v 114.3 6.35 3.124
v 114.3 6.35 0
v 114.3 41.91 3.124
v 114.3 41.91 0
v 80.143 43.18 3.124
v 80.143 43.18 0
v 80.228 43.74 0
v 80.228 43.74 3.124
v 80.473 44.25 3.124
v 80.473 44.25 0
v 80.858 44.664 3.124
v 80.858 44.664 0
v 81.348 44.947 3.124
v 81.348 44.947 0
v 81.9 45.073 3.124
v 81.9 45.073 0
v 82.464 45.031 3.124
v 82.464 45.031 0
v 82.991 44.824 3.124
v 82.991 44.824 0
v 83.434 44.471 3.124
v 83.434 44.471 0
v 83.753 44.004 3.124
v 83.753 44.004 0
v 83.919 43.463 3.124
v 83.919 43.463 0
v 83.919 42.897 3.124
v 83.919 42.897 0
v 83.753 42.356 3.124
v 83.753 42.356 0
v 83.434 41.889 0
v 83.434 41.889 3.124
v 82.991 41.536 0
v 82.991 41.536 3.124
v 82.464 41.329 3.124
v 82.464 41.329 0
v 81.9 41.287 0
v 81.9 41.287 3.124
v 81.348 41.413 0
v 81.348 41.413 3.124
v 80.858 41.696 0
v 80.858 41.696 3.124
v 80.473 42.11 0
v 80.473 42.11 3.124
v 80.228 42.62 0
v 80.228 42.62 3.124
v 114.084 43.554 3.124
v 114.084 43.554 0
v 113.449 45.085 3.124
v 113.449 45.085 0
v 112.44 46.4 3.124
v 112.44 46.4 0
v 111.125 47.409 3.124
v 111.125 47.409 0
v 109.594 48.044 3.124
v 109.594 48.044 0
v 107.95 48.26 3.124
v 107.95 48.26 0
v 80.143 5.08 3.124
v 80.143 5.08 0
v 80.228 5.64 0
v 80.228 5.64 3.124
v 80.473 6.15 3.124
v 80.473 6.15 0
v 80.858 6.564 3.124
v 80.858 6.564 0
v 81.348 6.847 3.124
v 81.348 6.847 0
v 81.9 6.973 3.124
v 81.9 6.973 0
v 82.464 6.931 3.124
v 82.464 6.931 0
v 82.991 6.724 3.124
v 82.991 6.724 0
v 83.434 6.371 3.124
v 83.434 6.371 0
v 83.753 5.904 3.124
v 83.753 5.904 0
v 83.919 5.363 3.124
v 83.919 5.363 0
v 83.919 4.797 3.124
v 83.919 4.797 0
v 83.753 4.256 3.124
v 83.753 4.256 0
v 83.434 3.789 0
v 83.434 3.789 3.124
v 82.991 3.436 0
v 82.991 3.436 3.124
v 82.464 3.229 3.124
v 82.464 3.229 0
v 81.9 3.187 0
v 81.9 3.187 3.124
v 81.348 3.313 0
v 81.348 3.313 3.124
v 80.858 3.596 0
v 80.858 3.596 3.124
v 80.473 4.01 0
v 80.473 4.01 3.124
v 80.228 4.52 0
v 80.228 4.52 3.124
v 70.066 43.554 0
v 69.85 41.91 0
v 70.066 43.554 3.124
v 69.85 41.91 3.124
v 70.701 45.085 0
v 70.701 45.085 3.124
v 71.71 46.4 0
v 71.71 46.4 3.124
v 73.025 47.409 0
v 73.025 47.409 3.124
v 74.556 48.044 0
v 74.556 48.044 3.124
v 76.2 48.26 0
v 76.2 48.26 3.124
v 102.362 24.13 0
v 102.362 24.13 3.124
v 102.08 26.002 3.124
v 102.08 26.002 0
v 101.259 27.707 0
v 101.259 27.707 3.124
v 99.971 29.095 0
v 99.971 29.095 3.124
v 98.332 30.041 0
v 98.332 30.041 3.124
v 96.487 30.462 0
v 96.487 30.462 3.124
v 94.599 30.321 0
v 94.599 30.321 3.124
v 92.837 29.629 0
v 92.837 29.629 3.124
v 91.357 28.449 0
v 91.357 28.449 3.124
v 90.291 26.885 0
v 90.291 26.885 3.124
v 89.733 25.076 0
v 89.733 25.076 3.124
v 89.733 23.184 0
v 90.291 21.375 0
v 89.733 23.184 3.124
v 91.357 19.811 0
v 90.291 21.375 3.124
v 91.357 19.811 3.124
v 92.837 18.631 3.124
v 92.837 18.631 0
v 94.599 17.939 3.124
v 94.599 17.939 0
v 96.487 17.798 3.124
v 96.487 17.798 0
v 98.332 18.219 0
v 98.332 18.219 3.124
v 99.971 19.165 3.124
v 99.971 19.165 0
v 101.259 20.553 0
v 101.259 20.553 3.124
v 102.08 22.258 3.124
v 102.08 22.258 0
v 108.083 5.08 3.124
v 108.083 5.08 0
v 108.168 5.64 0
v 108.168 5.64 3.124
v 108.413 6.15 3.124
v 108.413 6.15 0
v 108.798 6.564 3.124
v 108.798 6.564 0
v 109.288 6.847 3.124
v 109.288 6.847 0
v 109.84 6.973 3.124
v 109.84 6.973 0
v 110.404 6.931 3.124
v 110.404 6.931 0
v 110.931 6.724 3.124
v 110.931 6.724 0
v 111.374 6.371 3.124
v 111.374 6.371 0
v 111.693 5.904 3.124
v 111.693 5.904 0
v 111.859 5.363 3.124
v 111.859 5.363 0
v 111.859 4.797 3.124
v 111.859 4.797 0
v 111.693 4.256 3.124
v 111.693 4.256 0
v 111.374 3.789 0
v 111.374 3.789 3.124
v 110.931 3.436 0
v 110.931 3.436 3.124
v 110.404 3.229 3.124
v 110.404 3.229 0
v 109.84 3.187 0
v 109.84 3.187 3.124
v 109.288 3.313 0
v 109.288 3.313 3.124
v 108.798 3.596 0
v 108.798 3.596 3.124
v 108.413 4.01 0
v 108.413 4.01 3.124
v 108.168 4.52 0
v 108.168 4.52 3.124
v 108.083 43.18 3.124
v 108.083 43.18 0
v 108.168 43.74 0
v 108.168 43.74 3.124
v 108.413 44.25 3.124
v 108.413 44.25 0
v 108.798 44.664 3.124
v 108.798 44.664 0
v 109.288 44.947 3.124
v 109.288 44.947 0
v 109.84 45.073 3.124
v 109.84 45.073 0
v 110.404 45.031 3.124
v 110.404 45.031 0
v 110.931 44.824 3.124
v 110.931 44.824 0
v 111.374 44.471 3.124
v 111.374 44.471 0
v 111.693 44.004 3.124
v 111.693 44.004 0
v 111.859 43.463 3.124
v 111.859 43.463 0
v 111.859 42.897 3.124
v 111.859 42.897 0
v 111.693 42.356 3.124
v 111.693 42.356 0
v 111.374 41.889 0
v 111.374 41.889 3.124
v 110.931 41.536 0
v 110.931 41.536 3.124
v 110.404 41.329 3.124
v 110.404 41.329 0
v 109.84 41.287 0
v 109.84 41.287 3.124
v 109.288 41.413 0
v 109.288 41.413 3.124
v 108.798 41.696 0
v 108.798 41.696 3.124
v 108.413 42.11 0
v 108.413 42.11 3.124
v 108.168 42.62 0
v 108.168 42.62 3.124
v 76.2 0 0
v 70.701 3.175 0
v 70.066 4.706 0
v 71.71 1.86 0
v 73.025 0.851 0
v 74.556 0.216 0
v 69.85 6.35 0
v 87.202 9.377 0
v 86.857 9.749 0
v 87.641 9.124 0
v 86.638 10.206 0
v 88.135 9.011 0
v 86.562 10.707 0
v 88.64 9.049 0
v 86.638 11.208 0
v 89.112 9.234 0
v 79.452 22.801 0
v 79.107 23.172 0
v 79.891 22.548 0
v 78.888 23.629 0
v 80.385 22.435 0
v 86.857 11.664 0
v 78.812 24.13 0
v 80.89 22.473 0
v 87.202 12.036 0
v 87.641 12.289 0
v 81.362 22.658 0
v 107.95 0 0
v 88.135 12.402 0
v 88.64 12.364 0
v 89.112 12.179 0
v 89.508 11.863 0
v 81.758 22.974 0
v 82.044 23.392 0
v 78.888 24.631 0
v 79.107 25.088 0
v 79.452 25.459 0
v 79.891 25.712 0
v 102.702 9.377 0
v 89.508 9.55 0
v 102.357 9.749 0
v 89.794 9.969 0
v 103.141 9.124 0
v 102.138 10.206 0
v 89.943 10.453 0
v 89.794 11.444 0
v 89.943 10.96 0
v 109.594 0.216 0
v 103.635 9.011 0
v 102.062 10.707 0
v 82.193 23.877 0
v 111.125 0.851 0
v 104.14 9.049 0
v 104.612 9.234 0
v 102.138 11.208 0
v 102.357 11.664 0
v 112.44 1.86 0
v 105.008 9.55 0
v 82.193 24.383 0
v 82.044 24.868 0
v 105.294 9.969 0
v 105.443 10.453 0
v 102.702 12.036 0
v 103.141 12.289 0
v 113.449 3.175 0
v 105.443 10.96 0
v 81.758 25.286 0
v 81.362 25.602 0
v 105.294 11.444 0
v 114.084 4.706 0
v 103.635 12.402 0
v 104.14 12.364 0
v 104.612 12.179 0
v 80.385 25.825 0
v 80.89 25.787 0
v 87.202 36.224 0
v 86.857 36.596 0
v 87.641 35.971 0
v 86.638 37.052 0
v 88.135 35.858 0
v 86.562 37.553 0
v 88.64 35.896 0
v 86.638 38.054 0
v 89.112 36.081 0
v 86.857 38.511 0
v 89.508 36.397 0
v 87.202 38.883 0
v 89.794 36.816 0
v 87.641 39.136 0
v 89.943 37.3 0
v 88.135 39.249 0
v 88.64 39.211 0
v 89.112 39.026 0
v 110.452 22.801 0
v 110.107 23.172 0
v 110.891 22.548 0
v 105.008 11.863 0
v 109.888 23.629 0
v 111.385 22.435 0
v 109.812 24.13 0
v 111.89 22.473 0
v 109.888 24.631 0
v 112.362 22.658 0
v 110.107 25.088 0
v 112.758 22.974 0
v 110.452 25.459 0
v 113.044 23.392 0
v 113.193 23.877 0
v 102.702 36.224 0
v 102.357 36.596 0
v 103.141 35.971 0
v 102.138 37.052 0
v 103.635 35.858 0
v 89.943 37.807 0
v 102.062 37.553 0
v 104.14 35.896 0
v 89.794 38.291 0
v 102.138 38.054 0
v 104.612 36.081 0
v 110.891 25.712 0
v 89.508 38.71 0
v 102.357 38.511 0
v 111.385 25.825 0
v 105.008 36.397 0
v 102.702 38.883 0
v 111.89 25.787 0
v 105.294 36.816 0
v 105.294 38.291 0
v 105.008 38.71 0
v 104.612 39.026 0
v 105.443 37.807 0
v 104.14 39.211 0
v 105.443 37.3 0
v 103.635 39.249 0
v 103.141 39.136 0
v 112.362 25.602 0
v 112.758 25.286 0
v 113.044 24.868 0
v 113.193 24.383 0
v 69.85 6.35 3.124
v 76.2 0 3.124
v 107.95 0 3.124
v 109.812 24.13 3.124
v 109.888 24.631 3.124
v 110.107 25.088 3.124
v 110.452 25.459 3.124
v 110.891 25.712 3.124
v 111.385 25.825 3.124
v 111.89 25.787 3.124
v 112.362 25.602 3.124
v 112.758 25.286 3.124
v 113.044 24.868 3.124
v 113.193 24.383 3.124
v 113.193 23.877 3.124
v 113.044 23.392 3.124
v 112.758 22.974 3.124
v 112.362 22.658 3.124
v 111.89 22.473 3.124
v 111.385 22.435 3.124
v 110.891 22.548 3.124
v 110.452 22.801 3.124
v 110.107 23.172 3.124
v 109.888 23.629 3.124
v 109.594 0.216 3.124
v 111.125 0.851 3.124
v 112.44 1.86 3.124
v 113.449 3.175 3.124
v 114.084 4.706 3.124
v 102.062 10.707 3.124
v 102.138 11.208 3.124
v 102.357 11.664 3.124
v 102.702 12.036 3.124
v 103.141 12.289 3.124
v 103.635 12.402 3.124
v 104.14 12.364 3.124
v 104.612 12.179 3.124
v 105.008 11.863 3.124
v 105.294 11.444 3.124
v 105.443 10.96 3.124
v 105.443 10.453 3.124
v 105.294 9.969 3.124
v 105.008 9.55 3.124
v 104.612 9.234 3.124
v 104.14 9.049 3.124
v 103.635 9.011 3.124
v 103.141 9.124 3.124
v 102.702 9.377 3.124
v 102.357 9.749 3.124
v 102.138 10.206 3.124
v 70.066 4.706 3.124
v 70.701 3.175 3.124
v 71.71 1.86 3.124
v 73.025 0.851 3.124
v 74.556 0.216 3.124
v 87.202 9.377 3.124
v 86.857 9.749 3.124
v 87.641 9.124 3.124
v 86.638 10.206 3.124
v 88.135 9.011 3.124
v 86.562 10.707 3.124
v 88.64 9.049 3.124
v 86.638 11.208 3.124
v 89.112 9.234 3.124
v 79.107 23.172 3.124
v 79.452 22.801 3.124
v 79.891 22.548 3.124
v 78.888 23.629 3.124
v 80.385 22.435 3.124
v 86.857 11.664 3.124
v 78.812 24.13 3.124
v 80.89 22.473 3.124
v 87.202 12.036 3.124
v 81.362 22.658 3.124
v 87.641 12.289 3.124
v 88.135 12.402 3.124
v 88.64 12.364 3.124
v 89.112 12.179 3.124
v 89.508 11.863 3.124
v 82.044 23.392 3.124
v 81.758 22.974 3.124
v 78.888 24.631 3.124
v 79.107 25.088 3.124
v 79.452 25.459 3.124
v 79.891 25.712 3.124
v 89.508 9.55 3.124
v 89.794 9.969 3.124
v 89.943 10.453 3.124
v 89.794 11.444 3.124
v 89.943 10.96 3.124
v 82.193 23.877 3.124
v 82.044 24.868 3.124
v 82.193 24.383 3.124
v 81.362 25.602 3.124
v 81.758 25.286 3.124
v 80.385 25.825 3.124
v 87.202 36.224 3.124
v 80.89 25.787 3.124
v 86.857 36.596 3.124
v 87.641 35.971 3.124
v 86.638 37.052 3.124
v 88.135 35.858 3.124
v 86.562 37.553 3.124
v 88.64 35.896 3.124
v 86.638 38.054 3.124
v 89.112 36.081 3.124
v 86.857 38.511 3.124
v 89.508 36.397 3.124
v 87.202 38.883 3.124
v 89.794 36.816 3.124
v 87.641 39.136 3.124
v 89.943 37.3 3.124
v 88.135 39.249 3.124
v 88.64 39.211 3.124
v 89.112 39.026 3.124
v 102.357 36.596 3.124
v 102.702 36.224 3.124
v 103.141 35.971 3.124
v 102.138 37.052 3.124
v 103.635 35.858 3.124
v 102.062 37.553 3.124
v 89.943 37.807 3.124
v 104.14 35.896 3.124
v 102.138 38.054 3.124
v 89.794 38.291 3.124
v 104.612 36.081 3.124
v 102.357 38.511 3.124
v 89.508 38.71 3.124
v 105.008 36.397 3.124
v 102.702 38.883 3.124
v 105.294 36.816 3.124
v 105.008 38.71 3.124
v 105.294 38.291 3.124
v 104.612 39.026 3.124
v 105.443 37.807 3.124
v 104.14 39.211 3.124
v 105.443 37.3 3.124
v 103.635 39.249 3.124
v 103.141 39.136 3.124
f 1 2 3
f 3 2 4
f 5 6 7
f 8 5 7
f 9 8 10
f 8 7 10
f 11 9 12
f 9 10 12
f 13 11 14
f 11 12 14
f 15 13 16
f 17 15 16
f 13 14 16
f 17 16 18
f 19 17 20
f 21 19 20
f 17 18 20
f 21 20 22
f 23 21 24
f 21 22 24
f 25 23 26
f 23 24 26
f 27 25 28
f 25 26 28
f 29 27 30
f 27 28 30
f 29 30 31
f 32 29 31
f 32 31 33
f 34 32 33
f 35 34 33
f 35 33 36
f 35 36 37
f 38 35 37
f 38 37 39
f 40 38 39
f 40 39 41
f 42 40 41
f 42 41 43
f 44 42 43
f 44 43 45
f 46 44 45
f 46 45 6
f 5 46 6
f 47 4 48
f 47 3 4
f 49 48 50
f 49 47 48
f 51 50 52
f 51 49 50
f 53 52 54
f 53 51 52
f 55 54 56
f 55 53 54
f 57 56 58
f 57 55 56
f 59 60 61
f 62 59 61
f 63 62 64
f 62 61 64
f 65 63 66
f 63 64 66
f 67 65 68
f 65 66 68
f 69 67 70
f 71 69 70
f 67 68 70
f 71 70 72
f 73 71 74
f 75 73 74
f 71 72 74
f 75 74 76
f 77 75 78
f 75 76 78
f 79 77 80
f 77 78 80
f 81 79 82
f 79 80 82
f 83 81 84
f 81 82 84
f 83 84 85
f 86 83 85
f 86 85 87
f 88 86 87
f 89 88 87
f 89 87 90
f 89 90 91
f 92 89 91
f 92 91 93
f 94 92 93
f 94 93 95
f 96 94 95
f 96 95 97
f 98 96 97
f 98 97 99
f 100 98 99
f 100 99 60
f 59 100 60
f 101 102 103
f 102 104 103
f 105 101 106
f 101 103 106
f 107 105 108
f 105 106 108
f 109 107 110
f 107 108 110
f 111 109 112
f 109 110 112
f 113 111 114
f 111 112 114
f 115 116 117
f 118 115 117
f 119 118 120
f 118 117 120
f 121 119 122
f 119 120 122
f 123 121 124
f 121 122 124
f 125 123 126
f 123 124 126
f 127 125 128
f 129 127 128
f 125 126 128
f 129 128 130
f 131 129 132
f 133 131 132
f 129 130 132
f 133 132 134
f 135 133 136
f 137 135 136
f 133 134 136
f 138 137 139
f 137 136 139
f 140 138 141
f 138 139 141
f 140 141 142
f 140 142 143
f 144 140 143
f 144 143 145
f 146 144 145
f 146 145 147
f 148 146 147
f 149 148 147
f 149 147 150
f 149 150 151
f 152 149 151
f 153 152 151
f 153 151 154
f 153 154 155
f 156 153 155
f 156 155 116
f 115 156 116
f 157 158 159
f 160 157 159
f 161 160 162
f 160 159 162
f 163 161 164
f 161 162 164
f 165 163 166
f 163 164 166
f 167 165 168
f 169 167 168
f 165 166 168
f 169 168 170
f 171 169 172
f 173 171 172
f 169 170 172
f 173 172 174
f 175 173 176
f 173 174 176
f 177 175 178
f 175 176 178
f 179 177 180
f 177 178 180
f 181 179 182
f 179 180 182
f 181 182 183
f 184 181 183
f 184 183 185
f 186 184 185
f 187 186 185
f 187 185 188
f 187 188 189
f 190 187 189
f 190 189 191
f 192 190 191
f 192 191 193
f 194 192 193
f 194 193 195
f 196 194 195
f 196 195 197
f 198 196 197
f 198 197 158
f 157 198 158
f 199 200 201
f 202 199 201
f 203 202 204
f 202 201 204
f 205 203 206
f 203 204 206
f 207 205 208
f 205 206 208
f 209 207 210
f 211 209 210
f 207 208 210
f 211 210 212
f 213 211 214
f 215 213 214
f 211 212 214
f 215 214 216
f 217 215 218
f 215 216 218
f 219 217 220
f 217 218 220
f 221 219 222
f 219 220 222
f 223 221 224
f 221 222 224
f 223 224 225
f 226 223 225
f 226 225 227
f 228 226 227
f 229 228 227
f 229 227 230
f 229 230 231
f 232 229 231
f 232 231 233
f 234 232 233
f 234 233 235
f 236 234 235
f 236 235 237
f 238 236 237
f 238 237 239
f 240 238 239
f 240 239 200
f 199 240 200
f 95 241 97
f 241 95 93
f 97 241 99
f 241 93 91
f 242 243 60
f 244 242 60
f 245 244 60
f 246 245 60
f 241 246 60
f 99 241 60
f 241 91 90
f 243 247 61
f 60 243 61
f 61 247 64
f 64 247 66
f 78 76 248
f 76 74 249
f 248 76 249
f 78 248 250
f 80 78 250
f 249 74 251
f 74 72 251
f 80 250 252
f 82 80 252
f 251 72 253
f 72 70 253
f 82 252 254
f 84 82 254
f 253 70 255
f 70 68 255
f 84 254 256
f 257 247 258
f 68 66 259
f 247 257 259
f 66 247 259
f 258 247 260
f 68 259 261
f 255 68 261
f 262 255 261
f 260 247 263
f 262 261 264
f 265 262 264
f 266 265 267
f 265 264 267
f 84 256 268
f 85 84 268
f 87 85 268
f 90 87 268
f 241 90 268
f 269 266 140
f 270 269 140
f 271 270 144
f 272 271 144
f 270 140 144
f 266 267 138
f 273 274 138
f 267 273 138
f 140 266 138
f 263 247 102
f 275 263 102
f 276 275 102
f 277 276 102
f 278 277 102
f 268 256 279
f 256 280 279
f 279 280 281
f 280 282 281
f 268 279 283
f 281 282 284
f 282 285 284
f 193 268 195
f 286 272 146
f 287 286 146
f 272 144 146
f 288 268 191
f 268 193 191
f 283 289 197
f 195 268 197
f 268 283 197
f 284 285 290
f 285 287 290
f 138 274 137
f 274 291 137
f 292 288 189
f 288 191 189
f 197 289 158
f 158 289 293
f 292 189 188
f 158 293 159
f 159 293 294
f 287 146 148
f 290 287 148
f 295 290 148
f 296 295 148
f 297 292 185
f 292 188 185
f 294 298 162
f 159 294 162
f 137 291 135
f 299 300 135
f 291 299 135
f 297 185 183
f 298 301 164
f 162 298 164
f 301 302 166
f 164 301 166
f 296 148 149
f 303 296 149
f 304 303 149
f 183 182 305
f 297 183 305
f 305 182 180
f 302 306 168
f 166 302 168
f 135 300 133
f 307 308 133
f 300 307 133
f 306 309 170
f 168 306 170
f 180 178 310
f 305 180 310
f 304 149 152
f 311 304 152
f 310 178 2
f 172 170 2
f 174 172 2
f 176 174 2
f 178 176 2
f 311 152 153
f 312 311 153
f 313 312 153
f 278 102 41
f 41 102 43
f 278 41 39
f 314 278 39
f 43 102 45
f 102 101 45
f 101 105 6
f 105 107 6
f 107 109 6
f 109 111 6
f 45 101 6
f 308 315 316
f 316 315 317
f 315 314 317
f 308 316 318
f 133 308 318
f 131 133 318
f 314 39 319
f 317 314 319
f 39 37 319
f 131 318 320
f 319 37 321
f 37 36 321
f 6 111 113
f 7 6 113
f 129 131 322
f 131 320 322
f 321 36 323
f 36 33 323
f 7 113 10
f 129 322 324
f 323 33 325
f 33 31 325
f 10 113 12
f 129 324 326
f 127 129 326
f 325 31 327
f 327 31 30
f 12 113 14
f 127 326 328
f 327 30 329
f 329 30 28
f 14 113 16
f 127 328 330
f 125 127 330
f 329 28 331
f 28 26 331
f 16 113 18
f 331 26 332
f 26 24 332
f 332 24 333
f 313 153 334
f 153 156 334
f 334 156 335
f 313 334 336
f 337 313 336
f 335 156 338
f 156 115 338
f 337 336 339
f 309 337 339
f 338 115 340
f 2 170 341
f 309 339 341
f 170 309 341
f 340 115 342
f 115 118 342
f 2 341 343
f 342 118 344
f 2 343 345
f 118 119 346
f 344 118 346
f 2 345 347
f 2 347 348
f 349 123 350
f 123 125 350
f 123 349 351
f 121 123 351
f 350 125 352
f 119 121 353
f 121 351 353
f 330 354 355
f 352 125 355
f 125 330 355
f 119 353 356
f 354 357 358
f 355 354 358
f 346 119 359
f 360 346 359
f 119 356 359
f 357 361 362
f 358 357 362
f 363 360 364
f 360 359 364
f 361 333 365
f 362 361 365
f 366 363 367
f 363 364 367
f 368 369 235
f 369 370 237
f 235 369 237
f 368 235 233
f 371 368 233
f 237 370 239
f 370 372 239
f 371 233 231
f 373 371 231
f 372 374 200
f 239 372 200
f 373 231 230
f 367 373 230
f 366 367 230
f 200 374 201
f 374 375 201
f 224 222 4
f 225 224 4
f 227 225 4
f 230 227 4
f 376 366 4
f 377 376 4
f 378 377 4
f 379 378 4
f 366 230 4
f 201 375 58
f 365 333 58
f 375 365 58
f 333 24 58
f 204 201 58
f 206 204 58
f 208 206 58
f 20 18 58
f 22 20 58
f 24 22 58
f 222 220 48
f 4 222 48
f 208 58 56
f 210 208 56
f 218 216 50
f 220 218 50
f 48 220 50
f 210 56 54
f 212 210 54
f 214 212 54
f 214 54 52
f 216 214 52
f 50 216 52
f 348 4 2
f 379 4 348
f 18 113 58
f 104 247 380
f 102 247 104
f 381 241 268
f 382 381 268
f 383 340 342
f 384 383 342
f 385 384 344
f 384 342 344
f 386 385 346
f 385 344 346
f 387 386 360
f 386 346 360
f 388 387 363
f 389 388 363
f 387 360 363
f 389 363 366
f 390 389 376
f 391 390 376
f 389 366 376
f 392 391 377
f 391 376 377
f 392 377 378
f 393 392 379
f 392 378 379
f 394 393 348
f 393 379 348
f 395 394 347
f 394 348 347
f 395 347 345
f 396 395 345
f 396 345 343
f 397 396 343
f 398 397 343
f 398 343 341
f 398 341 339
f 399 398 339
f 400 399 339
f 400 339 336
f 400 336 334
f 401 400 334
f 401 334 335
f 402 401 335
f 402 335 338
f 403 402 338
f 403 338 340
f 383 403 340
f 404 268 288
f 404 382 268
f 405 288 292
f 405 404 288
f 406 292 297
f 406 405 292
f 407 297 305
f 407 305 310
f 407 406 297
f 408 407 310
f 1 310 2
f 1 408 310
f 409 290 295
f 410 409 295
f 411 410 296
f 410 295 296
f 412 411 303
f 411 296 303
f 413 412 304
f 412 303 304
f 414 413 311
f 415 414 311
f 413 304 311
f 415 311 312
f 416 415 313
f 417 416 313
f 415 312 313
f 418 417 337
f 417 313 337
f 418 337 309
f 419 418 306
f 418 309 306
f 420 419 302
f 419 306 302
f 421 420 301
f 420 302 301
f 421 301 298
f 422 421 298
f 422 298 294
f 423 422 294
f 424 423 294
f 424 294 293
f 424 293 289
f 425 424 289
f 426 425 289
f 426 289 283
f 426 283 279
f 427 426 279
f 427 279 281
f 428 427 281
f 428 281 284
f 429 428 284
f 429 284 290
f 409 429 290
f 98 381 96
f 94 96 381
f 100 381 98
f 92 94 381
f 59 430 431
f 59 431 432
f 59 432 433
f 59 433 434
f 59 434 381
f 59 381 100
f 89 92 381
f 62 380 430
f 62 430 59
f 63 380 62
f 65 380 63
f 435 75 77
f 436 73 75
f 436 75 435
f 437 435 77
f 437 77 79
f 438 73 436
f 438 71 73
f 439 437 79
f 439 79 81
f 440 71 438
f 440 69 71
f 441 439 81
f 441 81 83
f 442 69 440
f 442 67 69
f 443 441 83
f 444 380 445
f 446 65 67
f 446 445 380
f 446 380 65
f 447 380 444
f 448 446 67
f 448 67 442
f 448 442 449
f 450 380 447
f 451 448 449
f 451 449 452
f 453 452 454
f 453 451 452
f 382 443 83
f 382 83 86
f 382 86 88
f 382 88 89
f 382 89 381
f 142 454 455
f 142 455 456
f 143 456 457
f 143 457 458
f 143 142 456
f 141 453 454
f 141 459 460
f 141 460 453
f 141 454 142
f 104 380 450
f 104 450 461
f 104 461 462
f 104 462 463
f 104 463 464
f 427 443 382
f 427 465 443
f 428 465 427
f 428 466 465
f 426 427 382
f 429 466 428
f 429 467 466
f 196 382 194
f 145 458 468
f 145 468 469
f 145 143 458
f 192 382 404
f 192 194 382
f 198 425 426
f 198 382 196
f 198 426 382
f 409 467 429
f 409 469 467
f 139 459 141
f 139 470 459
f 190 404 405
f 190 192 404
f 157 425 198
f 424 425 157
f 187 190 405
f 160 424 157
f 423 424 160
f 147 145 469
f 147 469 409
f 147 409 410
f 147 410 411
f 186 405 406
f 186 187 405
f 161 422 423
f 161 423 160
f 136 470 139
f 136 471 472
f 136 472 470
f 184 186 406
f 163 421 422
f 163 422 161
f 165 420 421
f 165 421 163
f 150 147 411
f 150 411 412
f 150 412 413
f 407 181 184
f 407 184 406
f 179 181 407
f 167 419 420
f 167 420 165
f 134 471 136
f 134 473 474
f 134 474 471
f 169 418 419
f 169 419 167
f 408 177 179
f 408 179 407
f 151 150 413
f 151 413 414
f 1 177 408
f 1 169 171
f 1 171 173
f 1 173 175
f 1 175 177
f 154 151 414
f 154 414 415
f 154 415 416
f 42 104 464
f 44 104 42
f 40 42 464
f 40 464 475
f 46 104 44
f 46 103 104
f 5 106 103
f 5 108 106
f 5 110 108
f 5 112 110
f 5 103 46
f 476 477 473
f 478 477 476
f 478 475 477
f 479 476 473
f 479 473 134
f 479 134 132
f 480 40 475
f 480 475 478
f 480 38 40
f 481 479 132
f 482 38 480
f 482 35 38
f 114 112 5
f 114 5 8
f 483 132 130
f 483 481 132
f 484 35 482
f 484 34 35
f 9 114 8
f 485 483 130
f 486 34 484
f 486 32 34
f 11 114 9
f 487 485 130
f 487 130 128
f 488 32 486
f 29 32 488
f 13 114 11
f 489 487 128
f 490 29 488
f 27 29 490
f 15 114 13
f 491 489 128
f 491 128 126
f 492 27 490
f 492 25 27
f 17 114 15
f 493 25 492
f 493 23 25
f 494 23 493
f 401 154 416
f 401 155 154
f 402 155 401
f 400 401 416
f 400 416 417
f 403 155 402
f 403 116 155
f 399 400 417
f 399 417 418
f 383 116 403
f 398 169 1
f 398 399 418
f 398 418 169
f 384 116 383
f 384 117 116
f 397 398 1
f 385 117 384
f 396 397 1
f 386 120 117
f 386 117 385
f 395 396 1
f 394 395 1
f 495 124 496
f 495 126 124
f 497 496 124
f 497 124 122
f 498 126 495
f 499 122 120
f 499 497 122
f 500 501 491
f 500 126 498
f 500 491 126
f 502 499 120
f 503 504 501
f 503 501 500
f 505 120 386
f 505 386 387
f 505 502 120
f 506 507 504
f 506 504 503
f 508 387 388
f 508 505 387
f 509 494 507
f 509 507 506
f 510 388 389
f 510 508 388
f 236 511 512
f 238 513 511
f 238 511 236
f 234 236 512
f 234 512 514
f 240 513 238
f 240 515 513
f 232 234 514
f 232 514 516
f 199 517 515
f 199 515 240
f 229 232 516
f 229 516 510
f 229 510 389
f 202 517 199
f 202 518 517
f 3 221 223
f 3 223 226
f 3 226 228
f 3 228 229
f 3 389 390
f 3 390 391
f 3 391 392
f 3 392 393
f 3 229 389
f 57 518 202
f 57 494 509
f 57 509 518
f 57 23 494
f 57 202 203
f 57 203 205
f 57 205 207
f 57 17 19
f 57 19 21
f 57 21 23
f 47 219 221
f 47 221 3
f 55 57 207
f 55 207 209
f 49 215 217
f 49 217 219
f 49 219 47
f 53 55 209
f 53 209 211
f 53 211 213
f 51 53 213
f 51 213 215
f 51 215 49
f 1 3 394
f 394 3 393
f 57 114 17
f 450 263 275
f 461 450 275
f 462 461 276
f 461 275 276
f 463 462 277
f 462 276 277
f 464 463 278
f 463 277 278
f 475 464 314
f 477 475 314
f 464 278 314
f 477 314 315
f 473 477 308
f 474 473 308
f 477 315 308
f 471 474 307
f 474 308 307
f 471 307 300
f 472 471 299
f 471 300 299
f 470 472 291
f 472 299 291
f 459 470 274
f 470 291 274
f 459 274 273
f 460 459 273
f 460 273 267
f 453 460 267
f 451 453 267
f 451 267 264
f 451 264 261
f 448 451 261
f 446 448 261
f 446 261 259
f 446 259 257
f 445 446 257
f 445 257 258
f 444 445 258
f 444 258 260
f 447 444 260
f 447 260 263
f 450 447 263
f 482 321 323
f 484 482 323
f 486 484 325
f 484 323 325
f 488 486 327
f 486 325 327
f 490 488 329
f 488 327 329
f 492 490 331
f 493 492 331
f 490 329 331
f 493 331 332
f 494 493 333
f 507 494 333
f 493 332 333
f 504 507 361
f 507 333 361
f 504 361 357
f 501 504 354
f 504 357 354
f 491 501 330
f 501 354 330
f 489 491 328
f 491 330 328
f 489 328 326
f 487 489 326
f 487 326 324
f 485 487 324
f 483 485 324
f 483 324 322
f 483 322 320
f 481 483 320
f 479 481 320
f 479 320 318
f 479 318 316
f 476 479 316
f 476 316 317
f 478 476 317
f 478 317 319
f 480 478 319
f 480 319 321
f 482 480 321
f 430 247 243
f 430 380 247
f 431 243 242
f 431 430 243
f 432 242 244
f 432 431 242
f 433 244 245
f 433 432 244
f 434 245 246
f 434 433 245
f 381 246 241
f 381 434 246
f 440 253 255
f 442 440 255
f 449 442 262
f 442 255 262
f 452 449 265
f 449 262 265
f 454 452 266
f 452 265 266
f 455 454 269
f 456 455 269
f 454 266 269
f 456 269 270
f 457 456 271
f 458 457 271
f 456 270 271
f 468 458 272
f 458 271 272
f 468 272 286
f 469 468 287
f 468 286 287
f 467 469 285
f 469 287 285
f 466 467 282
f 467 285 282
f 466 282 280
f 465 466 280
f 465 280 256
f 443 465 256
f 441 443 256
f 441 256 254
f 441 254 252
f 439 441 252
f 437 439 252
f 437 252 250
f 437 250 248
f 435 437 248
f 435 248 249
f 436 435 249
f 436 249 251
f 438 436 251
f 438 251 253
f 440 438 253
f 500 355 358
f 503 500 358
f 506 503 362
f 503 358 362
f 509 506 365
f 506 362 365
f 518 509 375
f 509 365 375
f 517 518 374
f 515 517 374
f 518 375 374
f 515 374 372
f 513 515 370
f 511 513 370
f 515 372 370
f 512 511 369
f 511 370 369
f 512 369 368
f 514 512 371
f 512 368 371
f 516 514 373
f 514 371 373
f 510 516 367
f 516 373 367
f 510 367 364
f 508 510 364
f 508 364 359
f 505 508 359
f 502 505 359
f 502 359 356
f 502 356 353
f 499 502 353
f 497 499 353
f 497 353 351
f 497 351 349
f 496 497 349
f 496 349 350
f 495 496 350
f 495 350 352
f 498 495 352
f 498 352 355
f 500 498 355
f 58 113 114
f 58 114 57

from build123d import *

# Parameters (mm, degrees)
SKETCH1_W                 = 44.45
SKETCH1_H                 = 48.26
BOSS_EXTRUDE1_DEPTH       = 3.1242
FILLET1_R                 = 6.35
F_6_CLEARANCE_HOLE1_D     = 3.7973
F_6_CLEARANCE_HOLE1_DEPTH = 5.08
F_6_CLEARANCE_HOLE1_TIP   = 1.140824014
SKETCH4_R                 = 6.35
CUT_EXTRUDE1_DEPTH        = 4.1242
M3_CLEARANCE_HOLE1_D      = 3.4


with BuildPart() as part:
    # Sketch1 → Boss-Extrude1 (new body)
    with BuildSketch(Plane.XY):
        with Locations((92.075, 24.13)):
            Rectangle(SKETCH1_W, SKETCH1_H)
    extrude(amount=BOSS_EXTRUDE1_DEPTH)

    # Fillet1
    fillet1_edges = [part.edges().sort_by_distance(p)[0] for p in [
        (69.85, 48.26, 1.5621),
        (114.3, 48.26, 1.5621),
        (114.3, 0, 1.5621),
        (69.85, 0, 1.5621),
    ]]
    fillet(fillet1_edges, radius=FILLET1_R)

    # #6 Clearance Hole1
    with Locations(Plane.XY.offset(3.1242)):
        with Locations((82.042, 43.18), (109.982, 43.18), (109.982, 5.08), (82.042, 5.08)):
            Hole(F_6_CLEARANCE_HOLE1_D / 2, depth=F_6_CLEARANCE_HOLE1_DEPTH)
            with Locations((0, 0, -(F_6_CLEARANCE_HOLE1_DEPTH + F_6_CLEARANCE_HOLE1_TIP / 2))):  # 118° drill point
                Cone(0, F_6_CLEARANCE_HOLE1_D / 2, F_6_CLEARANCE_HOLE1_TIP, mode=Mode.SUBTRACT)

    # Sketch4 → Cut-Extrude1 (cut, through all)
    with BuildSketch(Plane.XY.offset(3.1242)):
        with Locations((96.012, 24.13)):
            Circle(SKETCH4_R)
    extrude(amount=-CUT_EXTRUDE1_DEPTH, mode=Mode.SUBTRACT)

    # M3 Clearance Hole1 (through all)
    with Locations(Plane.XY.offset(3.1242)):
        with Locations((111.512, 24.13), (103.762, 10.706606241), (88.262, 10.706606241), (80.512, 24.13), (88.262, 37.553393759), (103.762, 37.553393759), (96.012, 24.13)):
            Hole(M3_CLEARANCE_HOLE1_D / 2)


solid = part.part
